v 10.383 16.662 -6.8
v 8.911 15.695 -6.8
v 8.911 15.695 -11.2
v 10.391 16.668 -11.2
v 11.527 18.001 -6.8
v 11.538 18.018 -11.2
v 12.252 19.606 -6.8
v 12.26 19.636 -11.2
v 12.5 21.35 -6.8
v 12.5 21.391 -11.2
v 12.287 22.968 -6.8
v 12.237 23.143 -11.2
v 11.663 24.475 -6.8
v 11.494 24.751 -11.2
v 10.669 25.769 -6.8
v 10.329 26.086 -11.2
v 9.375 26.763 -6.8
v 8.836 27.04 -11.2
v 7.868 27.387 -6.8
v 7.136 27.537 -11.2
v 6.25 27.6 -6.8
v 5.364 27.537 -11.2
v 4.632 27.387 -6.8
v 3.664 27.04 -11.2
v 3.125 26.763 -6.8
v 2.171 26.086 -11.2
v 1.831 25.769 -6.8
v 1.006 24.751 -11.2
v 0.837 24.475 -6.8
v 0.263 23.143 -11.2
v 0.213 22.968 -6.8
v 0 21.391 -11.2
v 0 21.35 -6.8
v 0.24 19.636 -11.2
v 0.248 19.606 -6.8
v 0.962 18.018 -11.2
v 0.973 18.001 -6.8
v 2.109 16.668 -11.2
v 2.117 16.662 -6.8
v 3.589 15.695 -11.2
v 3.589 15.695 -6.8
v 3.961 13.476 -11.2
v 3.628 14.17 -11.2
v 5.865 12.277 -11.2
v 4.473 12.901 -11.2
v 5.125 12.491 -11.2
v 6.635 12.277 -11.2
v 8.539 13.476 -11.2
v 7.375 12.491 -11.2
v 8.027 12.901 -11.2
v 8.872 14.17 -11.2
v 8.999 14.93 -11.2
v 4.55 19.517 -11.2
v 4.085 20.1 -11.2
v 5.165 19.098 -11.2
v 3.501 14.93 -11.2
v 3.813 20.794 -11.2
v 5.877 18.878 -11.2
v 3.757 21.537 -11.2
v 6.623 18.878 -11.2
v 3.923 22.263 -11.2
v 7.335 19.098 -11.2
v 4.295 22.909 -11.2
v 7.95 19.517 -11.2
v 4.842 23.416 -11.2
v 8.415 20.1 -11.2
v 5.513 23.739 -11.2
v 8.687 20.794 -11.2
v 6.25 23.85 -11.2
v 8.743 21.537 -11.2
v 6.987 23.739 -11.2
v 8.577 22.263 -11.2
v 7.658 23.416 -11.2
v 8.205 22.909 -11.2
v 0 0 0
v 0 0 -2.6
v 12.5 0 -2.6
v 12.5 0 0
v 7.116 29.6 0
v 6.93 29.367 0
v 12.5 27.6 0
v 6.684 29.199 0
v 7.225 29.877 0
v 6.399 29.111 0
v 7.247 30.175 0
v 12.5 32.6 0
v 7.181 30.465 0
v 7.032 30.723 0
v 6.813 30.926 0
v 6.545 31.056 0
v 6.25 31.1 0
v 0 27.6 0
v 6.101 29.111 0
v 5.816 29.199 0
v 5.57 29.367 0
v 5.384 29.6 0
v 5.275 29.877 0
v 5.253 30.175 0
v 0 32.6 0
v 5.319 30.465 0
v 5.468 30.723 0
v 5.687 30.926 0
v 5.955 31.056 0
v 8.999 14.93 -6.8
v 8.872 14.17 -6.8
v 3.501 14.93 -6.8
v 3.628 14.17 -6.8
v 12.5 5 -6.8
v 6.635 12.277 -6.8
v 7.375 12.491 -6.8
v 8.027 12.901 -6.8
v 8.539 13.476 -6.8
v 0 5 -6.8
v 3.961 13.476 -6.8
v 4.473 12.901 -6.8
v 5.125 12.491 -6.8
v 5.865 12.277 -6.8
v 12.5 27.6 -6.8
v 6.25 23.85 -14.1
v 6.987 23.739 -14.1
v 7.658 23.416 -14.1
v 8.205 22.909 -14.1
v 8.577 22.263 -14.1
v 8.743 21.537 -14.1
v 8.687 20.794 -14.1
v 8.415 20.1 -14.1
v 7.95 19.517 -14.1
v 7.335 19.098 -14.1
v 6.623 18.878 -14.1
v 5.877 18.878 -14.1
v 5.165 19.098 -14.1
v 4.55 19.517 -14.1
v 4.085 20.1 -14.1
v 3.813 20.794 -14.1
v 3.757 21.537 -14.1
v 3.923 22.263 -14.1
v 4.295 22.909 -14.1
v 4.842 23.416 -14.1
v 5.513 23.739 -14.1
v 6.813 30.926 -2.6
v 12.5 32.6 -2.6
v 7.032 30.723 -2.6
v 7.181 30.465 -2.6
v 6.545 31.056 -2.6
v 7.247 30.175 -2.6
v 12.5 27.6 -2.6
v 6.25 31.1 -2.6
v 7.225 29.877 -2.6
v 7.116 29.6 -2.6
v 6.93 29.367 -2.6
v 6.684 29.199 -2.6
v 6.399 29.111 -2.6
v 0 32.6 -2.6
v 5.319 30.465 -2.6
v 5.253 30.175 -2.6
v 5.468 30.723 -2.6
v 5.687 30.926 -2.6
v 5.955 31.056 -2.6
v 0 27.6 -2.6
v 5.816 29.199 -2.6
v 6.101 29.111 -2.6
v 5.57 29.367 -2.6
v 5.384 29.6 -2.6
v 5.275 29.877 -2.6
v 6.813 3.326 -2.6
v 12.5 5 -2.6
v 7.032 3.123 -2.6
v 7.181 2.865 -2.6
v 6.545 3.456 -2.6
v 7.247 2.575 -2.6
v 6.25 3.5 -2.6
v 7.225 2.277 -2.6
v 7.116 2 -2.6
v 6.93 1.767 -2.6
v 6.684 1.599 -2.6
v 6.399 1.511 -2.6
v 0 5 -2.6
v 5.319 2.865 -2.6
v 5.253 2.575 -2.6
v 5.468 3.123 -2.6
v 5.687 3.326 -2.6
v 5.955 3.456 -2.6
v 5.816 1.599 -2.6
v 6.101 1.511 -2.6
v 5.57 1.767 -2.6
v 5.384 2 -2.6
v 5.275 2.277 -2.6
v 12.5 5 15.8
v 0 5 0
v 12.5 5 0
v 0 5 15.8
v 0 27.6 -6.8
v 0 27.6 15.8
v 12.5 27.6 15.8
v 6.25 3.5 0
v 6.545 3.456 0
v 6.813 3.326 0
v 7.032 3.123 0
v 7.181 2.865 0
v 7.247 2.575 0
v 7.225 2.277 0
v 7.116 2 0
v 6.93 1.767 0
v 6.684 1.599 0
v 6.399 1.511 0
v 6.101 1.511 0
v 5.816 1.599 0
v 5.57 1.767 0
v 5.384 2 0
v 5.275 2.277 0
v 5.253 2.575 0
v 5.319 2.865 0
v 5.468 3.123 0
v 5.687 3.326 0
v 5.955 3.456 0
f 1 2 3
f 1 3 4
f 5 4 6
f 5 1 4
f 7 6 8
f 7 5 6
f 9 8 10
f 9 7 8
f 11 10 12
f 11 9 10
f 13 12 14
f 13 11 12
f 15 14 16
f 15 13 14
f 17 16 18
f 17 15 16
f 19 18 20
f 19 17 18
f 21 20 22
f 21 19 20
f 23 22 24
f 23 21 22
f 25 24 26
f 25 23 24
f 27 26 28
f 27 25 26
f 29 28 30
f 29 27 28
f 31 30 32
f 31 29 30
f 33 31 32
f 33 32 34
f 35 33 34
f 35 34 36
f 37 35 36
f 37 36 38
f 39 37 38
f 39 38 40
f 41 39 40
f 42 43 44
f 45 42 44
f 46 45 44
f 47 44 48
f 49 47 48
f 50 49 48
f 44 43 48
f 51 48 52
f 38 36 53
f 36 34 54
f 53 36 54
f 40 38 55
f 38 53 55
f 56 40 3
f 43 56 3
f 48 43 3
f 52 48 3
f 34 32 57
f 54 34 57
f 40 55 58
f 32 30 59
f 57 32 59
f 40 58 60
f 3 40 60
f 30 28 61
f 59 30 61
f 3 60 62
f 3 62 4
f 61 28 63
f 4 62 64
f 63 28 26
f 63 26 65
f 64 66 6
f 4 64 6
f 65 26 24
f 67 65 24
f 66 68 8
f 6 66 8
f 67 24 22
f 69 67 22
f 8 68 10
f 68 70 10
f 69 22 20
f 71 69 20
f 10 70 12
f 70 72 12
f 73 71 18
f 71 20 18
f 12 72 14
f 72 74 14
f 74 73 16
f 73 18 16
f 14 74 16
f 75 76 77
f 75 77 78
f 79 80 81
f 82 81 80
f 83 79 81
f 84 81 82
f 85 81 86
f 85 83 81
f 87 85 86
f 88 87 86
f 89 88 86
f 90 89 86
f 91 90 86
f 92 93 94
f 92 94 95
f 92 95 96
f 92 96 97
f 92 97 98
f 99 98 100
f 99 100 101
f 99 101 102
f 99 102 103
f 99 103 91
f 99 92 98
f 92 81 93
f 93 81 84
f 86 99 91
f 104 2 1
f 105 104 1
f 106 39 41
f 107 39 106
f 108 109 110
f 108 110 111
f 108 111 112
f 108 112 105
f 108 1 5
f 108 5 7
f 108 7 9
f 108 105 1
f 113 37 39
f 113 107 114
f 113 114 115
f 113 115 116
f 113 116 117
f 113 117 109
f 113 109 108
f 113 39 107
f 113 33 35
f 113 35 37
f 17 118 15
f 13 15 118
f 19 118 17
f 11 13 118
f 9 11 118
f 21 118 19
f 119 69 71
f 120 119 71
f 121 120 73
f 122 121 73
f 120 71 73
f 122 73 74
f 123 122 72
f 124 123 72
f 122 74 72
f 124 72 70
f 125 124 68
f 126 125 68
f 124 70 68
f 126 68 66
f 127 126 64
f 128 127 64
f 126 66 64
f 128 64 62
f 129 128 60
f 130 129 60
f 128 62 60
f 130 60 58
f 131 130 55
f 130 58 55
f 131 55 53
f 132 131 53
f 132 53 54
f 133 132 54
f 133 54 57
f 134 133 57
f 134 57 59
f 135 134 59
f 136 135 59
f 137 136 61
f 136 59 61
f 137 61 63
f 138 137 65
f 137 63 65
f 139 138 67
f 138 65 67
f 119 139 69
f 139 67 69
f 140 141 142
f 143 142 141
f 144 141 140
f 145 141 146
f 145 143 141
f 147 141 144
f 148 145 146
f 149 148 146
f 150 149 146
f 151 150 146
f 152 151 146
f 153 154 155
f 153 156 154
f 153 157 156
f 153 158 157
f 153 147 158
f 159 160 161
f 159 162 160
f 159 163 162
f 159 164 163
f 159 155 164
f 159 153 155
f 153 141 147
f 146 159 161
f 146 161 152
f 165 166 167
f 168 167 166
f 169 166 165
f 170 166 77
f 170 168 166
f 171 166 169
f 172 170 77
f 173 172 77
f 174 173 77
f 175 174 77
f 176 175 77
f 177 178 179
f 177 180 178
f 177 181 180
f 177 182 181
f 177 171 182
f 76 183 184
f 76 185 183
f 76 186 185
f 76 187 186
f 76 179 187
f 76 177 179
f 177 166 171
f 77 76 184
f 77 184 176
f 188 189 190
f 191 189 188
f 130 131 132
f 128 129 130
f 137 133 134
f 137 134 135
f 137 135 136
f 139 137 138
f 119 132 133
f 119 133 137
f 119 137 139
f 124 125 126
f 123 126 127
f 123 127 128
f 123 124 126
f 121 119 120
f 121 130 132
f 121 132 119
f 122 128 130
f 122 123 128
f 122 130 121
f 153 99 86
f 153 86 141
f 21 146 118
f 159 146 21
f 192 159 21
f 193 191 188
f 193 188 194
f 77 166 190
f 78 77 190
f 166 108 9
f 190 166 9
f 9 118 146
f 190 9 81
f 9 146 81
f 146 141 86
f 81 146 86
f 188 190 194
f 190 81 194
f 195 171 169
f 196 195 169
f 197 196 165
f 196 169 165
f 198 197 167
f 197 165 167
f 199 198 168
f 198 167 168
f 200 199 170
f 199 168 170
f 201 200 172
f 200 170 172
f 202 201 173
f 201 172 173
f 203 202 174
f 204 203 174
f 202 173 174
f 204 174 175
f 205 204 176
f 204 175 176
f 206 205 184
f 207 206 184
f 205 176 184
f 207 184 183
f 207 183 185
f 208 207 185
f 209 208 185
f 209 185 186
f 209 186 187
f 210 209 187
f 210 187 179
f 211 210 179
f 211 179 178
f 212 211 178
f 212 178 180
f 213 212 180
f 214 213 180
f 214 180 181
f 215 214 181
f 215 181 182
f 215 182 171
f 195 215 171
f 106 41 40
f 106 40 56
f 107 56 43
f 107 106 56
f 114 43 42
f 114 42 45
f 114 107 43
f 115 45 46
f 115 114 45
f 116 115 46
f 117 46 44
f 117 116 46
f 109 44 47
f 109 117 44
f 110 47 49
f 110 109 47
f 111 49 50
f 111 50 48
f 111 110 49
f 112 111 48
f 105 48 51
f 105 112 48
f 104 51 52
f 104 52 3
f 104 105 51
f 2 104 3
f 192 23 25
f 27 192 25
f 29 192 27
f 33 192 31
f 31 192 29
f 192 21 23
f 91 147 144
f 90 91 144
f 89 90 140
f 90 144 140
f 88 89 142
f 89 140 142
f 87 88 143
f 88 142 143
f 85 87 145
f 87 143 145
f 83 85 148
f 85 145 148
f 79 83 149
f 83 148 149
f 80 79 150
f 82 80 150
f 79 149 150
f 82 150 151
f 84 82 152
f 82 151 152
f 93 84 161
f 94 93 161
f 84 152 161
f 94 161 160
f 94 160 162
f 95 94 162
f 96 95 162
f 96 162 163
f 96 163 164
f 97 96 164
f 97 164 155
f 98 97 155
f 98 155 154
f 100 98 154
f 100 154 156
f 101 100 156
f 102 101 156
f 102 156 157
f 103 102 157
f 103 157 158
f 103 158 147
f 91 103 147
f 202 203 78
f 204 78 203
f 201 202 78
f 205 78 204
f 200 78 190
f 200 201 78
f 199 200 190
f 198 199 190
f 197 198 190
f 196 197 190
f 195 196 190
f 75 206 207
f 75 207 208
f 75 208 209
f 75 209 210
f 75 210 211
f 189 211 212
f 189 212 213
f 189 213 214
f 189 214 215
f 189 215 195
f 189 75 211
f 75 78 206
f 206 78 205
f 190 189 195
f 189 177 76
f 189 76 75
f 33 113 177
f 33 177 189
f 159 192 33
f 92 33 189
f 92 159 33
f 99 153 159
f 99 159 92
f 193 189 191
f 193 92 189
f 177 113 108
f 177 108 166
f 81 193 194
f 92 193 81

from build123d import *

# Parameters (mm, degrees)
BOSS_EXTRUDE1_DEPTH = 12.5
BOSS_EXTRUDE2_DEPTH = 4.4
SKETCH3_R           = 2.5
BOSS_EXTRUDE3_DEPTH = 2.9
SKETCH4_R           = 1
CUT_EXTRUDE1_DEPTH  = 40.466061369


with BuildPart() as part:
    # Sketch1 → Boss-Extrude1 (new body)
    with BuildSketch(Plane(origin=(0, 0, 0), x_dir=(0, 0, -1), z_dir=(1, 0, 0))):
        Polygon((0, 0), (0, 5), (-15.8, 5), (-15.8, 27.6), (0, 27.6), (0, 32.6), (2.6, 32.6), (2.6, 27.6), (6.8, 27.6), (6.8, 5), (2.6, 5), (2.6, 0), align=None)
    extrude(amount=BOSS_EXTRUDE1_DEPTH)

    # Sketch2 → Boss-Extrude2 (add)
    with BuildSketch(Plane(origin=(0, 0, -6.8), x_dir=(-1, 0, 0), z_dir=(0, 0, -1))):
        with BuildLine():
            ThreePointArc((-8.910810534, 15.694685039), (-6.25, 27.6), (-3.589189466, 15.694685039))
            ThreePointArc((-3.589189466, 15.694685039), (-6.25, 12.25), (-8.910810534, 15.694685039))
        make_face()
    extrude(amount=BOSS_EXTRUDE2_DEPTH)

    # Sketch3 → Boss-Extrude3 (add)
    with BuildSketch(Plane(origin=(0, 0, -11.2), x_dir=(-1, 0, 0), z_dir=(0, 0, -1))):
        with Locations(Location((-6.25, 21.35, 0), (0, 0, 90))):
            Circle(SKETCH3_R)
    extrude(amount=BOSS_EXTRUDE3_DEPTH)

    # Sketch4 → Cut-Extrude1 (cut, through all)
    with BuildSketch(Plane(origin=(0, 0, -2.6), x_dir=(-1, 0, 0), z_dir=(0, 0, -1))):
        with Locations(Location((-6.25, 30.1, 0), (0, 0, 90))):
            Circle(SKETCH4_R)
        with Locations(Location((-6.25, 2.5, 0), (0, 0, 90))):
            Circle(SKETCH4_R)
    extrude(amount=-CUT_EXTRUDE1_DEPTH, mode=Mode.SUBTRACT)


solid = part.part
